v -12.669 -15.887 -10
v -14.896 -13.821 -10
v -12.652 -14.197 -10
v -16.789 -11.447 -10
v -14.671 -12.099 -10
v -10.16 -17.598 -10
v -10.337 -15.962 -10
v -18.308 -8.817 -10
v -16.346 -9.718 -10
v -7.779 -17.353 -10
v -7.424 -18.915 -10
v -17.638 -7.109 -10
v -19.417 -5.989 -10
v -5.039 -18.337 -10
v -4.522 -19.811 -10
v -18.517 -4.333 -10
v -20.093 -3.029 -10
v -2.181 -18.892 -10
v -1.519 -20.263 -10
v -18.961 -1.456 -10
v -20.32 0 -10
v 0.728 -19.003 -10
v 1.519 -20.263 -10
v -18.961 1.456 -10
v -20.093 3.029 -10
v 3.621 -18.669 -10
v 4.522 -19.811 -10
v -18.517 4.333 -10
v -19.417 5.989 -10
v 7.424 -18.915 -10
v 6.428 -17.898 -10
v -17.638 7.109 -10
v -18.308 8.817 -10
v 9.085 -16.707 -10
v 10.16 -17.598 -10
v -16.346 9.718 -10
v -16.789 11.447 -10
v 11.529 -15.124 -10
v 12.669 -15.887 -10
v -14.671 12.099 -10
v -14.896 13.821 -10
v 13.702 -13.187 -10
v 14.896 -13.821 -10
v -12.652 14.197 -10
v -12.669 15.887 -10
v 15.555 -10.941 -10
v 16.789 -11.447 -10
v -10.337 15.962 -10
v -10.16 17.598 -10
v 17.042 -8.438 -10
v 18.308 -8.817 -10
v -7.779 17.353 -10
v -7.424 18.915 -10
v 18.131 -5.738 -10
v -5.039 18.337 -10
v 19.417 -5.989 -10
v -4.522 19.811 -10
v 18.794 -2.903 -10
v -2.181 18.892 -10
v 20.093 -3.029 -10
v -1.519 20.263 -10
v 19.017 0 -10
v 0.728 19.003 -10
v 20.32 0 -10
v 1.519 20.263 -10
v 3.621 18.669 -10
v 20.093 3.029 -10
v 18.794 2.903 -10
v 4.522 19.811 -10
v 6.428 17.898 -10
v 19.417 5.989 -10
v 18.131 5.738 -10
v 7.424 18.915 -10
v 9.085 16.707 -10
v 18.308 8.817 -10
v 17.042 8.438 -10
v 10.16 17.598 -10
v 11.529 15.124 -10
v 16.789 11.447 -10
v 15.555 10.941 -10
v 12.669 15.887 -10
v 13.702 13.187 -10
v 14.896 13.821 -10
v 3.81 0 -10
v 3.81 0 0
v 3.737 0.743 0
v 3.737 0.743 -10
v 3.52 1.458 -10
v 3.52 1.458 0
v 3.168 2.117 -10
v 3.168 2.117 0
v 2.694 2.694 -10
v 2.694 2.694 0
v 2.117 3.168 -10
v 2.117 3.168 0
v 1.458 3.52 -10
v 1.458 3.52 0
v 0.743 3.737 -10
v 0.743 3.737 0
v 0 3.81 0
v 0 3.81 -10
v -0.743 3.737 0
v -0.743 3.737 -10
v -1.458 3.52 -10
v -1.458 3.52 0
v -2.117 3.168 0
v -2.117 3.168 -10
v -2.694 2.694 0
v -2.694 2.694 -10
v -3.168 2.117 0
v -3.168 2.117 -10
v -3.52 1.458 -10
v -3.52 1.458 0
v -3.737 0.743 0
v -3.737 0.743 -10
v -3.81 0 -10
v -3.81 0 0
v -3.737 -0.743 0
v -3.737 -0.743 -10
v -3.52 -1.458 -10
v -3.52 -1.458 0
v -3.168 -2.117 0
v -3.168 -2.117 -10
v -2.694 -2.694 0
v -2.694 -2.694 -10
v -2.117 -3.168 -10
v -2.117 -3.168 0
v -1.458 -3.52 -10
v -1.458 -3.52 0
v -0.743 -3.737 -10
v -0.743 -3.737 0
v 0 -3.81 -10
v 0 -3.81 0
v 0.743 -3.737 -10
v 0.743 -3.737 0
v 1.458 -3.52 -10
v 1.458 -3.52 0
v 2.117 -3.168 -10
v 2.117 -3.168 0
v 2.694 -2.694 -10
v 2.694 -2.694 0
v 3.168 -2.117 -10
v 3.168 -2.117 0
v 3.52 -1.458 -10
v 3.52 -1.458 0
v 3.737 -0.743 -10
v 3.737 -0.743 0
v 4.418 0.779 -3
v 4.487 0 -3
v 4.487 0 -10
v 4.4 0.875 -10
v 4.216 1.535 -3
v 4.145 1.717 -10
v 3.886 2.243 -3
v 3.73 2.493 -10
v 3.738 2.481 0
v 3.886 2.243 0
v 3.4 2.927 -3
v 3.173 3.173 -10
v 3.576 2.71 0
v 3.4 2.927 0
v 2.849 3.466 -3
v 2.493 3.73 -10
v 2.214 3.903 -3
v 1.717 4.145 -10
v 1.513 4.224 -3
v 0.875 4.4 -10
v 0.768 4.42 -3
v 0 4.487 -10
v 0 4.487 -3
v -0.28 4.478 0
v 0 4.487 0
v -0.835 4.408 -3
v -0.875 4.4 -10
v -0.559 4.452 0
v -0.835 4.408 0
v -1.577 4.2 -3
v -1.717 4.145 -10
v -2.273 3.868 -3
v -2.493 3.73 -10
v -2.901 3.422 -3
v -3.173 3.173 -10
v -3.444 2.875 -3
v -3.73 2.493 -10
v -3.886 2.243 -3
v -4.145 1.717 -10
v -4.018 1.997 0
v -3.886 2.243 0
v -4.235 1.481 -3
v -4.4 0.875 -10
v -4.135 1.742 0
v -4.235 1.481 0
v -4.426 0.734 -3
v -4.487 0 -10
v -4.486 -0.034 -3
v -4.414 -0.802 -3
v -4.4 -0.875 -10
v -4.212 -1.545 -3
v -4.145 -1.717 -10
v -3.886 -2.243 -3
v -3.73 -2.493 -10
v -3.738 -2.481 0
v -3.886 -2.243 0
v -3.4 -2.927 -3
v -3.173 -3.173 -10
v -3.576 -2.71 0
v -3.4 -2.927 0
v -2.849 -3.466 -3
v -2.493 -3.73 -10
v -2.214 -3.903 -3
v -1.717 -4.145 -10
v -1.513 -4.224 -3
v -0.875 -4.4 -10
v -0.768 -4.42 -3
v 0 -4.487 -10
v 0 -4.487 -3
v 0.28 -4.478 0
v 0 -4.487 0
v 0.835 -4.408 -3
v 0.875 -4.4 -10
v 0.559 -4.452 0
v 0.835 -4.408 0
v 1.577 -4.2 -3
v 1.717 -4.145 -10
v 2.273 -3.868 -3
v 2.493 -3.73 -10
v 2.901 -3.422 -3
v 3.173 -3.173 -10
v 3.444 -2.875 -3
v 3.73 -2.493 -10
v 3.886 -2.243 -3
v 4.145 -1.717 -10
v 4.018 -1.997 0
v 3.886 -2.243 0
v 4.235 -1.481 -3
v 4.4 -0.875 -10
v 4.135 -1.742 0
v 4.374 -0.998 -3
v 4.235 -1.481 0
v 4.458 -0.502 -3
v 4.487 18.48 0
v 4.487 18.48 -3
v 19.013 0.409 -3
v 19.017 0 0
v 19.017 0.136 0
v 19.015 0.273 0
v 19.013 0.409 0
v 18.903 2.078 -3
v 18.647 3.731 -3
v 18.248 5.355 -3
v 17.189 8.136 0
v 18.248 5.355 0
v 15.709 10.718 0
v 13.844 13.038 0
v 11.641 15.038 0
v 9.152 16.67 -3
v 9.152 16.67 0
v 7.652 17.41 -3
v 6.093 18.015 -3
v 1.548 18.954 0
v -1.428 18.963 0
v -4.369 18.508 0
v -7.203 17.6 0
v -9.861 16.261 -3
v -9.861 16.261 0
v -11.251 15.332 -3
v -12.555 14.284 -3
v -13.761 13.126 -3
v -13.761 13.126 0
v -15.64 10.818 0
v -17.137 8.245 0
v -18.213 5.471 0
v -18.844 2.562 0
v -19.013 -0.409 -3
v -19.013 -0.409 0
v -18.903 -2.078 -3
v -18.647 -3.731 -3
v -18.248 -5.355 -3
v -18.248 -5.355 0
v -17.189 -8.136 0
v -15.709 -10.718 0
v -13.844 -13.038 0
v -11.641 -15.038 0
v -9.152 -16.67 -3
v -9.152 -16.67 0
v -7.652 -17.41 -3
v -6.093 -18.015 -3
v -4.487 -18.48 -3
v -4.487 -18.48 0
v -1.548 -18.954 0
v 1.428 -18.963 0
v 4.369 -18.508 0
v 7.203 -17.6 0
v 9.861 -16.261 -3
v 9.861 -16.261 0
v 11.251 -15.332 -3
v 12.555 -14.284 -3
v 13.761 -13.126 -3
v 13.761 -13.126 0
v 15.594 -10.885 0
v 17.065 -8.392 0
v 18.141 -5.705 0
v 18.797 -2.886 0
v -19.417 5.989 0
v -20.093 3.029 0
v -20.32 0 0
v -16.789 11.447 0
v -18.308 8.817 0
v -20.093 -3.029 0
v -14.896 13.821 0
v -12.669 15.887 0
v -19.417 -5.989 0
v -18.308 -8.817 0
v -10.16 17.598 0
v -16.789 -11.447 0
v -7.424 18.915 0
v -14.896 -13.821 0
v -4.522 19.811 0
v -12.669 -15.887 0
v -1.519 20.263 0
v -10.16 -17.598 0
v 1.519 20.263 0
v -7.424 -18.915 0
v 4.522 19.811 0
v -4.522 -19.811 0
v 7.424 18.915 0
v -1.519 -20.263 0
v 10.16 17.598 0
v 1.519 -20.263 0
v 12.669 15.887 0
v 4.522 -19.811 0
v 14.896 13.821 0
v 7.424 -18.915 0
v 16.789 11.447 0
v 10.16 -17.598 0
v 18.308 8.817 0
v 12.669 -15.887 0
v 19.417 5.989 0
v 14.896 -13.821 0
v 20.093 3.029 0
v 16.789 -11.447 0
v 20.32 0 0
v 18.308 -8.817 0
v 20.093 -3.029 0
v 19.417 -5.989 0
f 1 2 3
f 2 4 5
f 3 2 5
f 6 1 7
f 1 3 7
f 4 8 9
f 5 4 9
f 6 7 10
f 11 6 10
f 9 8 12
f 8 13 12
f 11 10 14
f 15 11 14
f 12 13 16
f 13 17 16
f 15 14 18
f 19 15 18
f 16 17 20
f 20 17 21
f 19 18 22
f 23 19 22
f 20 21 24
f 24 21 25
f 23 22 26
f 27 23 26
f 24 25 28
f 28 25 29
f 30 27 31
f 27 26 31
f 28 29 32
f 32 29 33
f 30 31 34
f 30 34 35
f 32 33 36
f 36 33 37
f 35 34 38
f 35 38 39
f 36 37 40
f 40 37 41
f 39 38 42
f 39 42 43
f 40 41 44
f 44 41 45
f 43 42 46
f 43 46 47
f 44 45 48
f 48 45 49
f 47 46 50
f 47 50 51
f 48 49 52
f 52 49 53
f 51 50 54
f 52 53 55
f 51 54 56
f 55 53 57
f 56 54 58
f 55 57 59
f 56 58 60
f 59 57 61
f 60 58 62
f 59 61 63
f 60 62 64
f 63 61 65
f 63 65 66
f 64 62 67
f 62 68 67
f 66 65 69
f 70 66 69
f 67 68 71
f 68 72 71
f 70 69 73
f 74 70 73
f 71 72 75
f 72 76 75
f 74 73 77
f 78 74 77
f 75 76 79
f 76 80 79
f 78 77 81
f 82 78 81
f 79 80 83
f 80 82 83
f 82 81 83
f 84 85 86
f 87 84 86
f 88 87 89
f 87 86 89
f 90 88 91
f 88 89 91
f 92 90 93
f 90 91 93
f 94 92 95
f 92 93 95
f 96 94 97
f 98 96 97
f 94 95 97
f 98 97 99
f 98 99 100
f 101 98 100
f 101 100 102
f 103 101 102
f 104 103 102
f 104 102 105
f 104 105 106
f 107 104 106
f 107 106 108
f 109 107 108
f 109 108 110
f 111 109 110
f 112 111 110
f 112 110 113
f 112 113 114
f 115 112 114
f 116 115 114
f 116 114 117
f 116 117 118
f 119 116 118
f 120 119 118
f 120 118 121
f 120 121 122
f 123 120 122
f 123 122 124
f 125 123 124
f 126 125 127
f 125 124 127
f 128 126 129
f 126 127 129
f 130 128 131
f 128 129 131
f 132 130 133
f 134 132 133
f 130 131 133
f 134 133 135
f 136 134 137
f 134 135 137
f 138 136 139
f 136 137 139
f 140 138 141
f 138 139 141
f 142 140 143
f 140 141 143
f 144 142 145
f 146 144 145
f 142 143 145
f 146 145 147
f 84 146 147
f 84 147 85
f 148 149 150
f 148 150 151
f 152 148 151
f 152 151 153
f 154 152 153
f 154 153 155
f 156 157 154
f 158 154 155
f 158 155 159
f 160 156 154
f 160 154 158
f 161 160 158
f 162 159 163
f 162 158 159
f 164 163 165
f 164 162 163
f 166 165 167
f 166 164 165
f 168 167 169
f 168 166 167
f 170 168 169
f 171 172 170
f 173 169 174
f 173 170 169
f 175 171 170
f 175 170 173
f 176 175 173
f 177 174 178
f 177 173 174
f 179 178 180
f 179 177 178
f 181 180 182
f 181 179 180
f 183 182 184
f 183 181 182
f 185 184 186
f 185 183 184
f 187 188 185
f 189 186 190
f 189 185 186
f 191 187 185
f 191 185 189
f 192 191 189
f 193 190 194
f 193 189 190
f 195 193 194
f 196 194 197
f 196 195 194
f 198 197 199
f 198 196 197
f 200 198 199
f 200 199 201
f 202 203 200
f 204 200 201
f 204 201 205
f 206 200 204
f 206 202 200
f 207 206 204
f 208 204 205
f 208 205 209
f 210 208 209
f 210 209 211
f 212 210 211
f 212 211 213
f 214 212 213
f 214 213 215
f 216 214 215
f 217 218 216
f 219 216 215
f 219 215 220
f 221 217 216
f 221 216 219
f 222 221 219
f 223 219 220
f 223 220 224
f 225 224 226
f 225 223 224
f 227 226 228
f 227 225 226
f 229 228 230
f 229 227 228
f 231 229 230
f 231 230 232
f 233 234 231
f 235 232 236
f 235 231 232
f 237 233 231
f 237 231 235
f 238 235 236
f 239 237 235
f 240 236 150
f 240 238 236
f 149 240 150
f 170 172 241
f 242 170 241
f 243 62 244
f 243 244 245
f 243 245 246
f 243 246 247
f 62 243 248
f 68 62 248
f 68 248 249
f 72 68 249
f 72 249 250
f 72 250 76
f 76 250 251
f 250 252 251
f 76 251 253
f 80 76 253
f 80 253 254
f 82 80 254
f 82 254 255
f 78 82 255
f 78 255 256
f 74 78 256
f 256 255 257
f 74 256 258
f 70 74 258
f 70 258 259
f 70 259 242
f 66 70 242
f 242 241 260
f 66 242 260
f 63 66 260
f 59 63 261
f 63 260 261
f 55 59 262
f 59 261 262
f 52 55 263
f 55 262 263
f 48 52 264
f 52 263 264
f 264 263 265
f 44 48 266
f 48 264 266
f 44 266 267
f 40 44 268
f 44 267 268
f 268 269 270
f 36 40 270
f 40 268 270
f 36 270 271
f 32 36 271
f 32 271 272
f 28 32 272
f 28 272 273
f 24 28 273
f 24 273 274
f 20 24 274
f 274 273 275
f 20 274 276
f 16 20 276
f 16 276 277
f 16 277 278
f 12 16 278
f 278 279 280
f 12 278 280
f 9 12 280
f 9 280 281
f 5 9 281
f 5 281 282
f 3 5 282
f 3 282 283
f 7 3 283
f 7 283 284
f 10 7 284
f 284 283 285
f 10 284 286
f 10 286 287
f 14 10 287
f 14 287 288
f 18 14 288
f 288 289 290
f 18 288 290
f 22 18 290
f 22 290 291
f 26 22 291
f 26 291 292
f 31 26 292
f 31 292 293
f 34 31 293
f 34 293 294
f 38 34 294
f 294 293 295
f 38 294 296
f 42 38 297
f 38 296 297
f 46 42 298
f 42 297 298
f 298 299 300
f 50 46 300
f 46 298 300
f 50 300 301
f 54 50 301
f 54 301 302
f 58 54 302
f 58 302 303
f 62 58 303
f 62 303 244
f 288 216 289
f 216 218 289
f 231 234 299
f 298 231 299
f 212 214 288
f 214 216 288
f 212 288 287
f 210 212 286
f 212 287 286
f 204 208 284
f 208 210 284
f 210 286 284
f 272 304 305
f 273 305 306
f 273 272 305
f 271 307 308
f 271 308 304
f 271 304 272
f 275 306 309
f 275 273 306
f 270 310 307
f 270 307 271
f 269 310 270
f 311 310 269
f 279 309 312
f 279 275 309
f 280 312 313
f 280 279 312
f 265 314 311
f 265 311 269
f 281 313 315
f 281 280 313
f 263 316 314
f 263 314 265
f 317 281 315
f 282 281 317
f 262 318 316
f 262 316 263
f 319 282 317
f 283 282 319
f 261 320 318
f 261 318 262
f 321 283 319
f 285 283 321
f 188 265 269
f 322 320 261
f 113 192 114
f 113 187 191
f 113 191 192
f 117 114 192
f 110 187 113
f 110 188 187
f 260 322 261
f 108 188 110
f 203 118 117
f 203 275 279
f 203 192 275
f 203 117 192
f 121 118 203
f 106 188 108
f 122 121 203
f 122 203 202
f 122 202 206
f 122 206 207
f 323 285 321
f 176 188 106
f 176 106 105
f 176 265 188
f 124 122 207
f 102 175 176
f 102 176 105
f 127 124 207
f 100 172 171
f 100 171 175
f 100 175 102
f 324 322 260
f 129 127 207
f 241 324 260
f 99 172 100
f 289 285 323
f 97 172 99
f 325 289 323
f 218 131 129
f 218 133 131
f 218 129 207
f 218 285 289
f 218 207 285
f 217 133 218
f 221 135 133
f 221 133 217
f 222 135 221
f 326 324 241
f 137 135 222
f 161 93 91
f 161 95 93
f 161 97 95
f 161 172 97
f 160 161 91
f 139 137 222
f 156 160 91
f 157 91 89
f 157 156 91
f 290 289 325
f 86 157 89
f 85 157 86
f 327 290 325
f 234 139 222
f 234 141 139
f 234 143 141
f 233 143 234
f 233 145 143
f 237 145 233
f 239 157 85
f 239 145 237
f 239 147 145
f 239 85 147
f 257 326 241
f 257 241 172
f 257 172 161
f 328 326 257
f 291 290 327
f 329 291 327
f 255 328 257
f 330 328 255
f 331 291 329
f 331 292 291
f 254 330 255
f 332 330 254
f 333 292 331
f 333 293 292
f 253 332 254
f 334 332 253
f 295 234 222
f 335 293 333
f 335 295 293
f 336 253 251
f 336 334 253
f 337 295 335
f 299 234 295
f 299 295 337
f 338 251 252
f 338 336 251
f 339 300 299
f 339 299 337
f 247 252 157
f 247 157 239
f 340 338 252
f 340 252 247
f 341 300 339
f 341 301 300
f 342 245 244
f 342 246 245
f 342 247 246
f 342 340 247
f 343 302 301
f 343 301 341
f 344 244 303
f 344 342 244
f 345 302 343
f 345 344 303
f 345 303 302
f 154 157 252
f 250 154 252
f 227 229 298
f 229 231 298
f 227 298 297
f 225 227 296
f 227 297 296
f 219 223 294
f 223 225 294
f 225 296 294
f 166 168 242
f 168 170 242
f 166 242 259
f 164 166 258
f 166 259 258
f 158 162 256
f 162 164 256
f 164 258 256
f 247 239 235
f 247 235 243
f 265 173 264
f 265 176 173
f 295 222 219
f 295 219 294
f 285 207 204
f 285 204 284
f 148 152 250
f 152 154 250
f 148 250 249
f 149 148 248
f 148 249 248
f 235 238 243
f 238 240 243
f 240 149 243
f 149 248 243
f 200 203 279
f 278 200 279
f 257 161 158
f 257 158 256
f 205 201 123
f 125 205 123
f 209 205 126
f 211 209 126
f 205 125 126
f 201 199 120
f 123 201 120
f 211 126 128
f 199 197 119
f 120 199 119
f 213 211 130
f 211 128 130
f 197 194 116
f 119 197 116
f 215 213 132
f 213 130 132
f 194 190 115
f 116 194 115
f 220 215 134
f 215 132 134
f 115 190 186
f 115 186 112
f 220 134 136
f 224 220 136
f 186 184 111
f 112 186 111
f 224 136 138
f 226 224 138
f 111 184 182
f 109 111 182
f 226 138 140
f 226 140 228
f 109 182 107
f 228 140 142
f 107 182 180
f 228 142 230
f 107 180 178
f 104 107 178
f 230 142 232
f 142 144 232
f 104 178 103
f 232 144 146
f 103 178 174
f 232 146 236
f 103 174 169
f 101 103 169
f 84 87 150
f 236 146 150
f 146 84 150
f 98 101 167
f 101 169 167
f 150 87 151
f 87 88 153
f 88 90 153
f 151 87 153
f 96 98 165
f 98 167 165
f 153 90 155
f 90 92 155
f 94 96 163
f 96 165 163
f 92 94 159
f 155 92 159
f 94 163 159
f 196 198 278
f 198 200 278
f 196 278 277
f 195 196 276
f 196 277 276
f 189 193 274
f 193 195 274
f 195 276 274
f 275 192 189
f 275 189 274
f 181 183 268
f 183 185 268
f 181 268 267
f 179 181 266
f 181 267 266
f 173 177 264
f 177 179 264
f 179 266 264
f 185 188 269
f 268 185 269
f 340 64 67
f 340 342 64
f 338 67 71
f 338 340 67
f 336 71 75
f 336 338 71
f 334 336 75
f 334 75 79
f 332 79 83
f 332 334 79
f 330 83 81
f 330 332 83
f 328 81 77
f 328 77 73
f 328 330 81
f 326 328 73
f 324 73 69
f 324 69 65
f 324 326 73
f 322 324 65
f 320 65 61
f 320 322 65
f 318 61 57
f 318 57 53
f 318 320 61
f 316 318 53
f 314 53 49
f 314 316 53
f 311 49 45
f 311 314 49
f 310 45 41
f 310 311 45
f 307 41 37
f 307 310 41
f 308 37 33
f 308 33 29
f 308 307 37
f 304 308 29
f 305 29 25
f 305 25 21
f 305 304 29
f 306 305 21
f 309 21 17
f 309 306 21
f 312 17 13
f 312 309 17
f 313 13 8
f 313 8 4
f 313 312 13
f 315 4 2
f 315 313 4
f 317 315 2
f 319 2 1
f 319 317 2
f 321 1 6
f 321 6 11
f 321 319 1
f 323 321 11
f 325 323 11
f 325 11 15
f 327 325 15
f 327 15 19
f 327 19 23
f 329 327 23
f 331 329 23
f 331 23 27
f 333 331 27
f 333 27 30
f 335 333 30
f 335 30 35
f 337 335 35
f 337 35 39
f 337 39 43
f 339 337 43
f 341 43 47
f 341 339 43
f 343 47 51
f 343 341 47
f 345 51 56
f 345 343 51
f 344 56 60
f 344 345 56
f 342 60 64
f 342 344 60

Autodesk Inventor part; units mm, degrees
ref_plane "YZ Plane" through (0, 0, 0) normal (1, 0, 0) x (0, 1, 0)
ref_plane "XZ Plane" through (0, 0, 0) normal (0, 1, 0) x (-1, 0, 0)
sketch "Sketch1" plane through (0, 0, 0) normal (0, 0, 1) x (1, 0, 0)
  circle A0 centre (0, 0) radius 3.81
  circle A1 centre (0, 0) radius 4.4866
  circle A2 centre (0, 0) radius 20.32
  circle A3 centre (0, 0) radius 19.017
  dimension "d0" = 7.62
  dimension "d1" = 40.64
extrude "Extrusion1" add sketch "Sketch1" against normal blind 10
ref_plane "Work Plane1" through (0, 0, 0) normal (0, 0, 1) x (1, 0, 0)
sketch "Sketch2" plane through (0, 0, 0) normal (0, 0, 1) x (1, 0, 0)
  circle A0 centre (0, 0) radius 4.4866 projected
  circle A1 centre (0, 0) radius 19.017 projected
  line L0 (0, 4.4866) -> (4.4866, 18.4802)
  line L1 (3.4, 2.9274) -> (9.1521, 16.6699)
extrude "Extrusion2" add sketch "Sketch2" against normal blind 3 contours A0 L0 A1 L1 picked at (3.8455, 13.626)
pattern_circular "Circular Pattern1" count 6 over 360 about axis through (0, 0, 0) along (0, 0, -1) of "Extrusion2"
